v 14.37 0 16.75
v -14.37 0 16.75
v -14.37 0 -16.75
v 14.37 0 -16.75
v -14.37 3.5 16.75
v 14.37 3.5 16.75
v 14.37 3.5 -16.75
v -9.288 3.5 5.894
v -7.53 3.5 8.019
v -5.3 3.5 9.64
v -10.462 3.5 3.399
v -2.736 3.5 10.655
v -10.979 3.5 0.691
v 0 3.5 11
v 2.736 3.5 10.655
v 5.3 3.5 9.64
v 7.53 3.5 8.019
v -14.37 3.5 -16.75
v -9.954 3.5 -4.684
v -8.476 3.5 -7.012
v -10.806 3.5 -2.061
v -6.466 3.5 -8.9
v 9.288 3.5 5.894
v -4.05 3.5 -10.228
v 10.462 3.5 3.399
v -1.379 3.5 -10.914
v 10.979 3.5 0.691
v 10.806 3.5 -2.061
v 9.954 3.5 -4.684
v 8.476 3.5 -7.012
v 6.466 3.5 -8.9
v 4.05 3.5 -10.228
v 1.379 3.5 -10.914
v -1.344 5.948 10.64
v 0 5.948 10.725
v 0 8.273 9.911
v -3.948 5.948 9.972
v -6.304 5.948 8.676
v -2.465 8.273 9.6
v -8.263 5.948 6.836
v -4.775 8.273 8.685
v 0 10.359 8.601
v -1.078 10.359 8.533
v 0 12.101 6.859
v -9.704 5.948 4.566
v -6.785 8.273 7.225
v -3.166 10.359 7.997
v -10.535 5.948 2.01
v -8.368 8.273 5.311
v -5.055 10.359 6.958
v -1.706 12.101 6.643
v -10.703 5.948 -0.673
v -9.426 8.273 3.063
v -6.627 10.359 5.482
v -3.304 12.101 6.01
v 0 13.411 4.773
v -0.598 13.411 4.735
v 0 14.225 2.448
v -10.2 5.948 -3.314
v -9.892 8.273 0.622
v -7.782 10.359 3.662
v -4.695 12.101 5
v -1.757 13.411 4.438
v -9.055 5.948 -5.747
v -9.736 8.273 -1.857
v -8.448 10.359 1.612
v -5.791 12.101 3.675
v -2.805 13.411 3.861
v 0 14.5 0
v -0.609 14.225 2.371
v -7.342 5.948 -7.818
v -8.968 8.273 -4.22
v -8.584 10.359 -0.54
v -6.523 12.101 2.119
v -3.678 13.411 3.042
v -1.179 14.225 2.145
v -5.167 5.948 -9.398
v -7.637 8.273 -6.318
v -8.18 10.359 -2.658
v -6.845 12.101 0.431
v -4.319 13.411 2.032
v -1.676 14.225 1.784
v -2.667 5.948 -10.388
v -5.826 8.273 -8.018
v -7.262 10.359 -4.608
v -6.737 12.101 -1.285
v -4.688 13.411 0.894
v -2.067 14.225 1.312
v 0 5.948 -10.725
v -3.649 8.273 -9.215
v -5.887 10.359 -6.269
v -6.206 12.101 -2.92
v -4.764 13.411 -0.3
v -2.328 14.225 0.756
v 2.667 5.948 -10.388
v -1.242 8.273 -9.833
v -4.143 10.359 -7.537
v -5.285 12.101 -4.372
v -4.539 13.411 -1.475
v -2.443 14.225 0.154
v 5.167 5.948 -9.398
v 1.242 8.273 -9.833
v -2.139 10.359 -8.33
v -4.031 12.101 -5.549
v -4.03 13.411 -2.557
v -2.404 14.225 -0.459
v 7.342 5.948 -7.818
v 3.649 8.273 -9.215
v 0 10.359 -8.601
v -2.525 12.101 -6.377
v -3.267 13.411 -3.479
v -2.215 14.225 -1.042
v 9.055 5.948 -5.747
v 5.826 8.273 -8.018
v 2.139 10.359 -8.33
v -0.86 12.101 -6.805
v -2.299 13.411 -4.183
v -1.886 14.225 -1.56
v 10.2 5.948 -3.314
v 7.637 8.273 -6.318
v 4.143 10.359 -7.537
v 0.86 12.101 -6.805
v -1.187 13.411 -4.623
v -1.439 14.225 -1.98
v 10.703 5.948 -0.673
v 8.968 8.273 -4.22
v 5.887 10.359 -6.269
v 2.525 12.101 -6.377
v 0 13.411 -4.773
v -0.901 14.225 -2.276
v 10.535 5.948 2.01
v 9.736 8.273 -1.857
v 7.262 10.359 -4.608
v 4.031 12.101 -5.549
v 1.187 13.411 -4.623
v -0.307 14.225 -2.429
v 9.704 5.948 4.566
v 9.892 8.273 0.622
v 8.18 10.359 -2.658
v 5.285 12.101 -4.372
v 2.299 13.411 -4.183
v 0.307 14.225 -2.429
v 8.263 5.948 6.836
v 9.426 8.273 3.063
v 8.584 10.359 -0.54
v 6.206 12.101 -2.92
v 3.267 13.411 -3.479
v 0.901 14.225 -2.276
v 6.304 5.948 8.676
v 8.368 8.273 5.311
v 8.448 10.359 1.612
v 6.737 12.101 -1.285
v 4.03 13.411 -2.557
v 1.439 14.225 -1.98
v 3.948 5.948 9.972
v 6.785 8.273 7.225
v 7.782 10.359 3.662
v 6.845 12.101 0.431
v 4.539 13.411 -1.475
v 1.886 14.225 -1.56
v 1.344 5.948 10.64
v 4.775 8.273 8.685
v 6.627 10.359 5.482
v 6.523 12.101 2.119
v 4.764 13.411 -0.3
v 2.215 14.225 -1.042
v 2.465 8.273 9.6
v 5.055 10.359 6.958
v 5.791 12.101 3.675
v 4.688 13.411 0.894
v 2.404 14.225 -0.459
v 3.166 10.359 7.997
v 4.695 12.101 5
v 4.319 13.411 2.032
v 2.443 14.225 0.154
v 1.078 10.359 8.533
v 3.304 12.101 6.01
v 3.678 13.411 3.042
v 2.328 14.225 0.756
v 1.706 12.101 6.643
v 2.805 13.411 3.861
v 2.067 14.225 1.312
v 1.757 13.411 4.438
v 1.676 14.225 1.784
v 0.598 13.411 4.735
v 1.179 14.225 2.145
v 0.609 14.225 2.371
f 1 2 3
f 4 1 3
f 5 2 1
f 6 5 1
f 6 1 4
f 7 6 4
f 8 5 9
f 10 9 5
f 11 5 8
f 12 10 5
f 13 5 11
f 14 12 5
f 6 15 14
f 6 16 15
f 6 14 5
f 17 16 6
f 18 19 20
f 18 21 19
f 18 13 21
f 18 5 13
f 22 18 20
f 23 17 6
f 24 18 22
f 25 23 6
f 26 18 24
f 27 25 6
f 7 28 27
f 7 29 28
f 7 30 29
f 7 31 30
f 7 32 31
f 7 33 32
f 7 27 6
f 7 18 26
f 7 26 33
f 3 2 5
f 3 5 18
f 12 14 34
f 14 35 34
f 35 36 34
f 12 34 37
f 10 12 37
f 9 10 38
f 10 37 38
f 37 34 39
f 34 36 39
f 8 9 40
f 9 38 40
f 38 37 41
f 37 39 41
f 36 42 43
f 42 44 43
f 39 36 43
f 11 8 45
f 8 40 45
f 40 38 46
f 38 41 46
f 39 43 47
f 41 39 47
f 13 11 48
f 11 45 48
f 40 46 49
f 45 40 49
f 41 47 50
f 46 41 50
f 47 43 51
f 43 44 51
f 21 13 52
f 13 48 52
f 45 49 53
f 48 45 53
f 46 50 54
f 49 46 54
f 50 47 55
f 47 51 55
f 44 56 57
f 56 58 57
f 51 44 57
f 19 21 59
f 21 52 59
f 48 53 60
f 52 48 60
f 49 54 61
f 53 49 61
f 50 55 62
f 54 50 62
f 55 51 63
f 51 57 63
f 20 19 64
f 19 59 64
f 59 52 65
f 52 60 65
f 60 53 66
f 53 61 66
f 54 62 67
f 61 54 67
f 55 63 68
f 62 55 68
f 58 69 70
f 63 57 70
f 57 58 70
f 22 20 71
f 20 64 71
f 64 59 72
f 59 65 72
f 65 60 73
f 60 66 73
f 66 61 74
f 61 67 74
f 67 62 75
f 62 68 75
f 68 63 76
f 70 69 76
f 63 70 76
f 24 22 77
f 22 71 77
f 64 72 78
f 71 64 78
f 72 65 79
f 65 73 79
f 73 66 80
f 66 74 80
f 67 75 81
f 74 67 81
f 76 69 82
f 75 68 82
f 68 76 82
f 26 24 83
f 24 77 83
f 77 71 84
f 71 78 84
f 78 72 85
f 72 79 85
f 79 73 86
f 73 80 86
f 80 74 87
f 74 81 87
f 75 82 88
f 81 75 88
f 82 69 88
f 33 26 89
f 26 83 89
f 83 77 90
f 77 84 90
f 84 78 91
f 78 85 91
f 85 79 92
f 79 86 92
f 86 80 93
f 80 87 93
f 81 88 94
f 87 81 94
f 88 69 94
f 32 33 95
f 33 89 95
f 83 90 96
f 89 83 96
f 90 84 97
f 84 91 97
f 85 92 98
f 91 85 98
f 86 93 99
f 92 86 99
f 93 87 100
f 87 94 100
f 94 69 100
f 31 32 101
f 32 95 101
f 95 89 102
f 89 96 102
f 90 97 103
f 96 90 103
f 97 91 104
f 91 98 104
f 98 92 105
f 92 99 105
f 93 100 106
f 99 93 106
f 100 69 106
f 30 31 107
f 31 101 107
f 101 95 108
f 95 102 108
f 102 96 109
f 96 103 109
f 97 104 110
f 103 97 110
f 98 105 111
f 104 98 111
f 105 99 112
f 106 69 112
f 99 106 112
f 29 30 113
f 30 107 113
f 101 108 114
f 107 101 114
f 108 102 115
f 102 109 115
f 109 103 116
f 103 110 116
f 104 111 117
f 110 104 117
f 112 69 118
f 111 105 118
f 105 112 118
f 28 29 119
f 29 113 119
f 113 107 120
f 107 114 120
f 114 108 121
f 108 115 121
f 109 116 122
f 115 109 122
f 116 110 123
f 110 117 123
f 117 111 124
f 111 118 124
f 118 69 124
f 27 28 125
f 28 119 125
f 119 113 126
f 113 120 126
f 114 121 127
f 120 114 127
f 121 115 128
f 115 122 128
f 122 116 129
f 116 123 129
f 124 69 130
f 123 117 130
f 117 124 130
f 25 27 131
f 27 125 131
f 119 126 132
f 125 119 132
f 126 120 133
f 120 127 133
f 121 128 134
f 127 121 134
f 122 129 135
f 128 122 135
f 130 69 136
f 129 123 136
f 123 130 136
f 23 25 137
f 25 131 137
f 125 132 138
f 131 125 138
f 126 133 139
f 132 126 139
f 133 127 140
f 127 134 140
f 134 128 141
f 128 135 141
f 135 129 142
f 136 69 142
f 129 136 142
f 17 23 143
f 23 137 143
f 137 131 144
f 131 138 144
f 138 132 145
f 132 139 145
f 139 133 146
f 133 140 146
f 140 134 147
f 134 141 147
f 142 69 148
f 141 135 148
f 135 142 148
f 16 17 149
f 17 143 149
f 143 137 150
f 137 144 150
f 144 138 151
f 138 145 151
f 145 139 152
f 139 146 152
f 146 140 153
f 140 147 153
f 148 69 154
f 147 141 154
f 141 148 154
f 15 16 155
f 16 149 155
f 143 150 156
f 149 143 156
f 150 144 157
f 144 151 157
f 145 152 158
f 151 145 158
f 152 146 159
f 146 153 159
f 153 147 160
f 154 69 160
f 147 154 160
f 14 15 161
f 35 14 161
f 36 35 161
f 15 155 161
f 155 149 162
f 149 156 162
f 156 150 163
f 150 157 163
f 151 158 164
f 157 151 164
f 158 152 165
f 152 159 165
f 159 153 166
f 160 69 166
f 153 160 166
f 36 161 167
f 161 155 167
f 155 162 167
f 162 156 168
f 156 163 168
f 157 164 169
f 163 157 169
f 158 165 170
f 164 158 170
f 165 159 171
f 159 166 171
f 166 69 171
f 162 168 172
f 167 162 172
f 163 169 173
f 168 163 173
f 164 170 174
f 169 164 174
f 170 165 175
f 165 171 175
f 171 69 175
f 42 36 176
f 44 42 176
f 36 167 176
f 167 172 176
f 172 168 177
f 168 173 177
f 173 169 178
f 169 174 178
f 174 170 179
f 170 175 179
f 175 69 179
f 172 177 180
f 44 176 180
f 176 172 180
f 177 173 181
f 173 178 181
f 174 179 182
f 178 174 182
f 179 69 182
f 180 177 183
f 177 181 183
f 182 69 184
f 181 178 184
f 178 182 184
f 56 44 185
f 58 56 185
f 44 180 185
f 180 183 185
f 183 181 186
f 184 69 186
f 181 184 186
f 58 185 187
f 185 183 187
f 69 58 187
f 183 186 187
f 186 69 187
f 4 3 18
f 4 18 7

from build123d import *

# Parameters (mm, degrees)
SKETCH1_W           = 28.74
SKETCH1_H           = 33.5
BOSS_EXTRUDE1_DEPTH = 3.5


with BuildPart() as part:
    # Sketch1 → Boss-Extrude1 (new body)
    with BuildSketch(Plane(origin=(0, 0, 0), x_dir=(1, 0, 0), z_dir=(0, 1, 0))):
        Rectangle(SKETCH1_W, SKETCH1_H)
    extrude(amount=BOSS_EXTRUDE1_DEPTH)

    # Sketch4 → Revolve1 (revolve)
    with BuildSketch(Plane(origin=(0, 0, 0), x_dir=(0, 0, -1), z_dir=(1, 0, 0))):
        with BuildLine():
            Line((0, 0), (-11, 0))
            Line((-11, 0), (-11, 3.4))
            ThreePointArc((-11, 3.4), (-7.813771351, 11.243059943), (0, 14.500454536))
            Line((0, 14.500454536), (0, 0))
        make_face()
    revolve(axis=Axis((0, 14.500454536, 0), (0, -1, 0)))


solid = part.part
